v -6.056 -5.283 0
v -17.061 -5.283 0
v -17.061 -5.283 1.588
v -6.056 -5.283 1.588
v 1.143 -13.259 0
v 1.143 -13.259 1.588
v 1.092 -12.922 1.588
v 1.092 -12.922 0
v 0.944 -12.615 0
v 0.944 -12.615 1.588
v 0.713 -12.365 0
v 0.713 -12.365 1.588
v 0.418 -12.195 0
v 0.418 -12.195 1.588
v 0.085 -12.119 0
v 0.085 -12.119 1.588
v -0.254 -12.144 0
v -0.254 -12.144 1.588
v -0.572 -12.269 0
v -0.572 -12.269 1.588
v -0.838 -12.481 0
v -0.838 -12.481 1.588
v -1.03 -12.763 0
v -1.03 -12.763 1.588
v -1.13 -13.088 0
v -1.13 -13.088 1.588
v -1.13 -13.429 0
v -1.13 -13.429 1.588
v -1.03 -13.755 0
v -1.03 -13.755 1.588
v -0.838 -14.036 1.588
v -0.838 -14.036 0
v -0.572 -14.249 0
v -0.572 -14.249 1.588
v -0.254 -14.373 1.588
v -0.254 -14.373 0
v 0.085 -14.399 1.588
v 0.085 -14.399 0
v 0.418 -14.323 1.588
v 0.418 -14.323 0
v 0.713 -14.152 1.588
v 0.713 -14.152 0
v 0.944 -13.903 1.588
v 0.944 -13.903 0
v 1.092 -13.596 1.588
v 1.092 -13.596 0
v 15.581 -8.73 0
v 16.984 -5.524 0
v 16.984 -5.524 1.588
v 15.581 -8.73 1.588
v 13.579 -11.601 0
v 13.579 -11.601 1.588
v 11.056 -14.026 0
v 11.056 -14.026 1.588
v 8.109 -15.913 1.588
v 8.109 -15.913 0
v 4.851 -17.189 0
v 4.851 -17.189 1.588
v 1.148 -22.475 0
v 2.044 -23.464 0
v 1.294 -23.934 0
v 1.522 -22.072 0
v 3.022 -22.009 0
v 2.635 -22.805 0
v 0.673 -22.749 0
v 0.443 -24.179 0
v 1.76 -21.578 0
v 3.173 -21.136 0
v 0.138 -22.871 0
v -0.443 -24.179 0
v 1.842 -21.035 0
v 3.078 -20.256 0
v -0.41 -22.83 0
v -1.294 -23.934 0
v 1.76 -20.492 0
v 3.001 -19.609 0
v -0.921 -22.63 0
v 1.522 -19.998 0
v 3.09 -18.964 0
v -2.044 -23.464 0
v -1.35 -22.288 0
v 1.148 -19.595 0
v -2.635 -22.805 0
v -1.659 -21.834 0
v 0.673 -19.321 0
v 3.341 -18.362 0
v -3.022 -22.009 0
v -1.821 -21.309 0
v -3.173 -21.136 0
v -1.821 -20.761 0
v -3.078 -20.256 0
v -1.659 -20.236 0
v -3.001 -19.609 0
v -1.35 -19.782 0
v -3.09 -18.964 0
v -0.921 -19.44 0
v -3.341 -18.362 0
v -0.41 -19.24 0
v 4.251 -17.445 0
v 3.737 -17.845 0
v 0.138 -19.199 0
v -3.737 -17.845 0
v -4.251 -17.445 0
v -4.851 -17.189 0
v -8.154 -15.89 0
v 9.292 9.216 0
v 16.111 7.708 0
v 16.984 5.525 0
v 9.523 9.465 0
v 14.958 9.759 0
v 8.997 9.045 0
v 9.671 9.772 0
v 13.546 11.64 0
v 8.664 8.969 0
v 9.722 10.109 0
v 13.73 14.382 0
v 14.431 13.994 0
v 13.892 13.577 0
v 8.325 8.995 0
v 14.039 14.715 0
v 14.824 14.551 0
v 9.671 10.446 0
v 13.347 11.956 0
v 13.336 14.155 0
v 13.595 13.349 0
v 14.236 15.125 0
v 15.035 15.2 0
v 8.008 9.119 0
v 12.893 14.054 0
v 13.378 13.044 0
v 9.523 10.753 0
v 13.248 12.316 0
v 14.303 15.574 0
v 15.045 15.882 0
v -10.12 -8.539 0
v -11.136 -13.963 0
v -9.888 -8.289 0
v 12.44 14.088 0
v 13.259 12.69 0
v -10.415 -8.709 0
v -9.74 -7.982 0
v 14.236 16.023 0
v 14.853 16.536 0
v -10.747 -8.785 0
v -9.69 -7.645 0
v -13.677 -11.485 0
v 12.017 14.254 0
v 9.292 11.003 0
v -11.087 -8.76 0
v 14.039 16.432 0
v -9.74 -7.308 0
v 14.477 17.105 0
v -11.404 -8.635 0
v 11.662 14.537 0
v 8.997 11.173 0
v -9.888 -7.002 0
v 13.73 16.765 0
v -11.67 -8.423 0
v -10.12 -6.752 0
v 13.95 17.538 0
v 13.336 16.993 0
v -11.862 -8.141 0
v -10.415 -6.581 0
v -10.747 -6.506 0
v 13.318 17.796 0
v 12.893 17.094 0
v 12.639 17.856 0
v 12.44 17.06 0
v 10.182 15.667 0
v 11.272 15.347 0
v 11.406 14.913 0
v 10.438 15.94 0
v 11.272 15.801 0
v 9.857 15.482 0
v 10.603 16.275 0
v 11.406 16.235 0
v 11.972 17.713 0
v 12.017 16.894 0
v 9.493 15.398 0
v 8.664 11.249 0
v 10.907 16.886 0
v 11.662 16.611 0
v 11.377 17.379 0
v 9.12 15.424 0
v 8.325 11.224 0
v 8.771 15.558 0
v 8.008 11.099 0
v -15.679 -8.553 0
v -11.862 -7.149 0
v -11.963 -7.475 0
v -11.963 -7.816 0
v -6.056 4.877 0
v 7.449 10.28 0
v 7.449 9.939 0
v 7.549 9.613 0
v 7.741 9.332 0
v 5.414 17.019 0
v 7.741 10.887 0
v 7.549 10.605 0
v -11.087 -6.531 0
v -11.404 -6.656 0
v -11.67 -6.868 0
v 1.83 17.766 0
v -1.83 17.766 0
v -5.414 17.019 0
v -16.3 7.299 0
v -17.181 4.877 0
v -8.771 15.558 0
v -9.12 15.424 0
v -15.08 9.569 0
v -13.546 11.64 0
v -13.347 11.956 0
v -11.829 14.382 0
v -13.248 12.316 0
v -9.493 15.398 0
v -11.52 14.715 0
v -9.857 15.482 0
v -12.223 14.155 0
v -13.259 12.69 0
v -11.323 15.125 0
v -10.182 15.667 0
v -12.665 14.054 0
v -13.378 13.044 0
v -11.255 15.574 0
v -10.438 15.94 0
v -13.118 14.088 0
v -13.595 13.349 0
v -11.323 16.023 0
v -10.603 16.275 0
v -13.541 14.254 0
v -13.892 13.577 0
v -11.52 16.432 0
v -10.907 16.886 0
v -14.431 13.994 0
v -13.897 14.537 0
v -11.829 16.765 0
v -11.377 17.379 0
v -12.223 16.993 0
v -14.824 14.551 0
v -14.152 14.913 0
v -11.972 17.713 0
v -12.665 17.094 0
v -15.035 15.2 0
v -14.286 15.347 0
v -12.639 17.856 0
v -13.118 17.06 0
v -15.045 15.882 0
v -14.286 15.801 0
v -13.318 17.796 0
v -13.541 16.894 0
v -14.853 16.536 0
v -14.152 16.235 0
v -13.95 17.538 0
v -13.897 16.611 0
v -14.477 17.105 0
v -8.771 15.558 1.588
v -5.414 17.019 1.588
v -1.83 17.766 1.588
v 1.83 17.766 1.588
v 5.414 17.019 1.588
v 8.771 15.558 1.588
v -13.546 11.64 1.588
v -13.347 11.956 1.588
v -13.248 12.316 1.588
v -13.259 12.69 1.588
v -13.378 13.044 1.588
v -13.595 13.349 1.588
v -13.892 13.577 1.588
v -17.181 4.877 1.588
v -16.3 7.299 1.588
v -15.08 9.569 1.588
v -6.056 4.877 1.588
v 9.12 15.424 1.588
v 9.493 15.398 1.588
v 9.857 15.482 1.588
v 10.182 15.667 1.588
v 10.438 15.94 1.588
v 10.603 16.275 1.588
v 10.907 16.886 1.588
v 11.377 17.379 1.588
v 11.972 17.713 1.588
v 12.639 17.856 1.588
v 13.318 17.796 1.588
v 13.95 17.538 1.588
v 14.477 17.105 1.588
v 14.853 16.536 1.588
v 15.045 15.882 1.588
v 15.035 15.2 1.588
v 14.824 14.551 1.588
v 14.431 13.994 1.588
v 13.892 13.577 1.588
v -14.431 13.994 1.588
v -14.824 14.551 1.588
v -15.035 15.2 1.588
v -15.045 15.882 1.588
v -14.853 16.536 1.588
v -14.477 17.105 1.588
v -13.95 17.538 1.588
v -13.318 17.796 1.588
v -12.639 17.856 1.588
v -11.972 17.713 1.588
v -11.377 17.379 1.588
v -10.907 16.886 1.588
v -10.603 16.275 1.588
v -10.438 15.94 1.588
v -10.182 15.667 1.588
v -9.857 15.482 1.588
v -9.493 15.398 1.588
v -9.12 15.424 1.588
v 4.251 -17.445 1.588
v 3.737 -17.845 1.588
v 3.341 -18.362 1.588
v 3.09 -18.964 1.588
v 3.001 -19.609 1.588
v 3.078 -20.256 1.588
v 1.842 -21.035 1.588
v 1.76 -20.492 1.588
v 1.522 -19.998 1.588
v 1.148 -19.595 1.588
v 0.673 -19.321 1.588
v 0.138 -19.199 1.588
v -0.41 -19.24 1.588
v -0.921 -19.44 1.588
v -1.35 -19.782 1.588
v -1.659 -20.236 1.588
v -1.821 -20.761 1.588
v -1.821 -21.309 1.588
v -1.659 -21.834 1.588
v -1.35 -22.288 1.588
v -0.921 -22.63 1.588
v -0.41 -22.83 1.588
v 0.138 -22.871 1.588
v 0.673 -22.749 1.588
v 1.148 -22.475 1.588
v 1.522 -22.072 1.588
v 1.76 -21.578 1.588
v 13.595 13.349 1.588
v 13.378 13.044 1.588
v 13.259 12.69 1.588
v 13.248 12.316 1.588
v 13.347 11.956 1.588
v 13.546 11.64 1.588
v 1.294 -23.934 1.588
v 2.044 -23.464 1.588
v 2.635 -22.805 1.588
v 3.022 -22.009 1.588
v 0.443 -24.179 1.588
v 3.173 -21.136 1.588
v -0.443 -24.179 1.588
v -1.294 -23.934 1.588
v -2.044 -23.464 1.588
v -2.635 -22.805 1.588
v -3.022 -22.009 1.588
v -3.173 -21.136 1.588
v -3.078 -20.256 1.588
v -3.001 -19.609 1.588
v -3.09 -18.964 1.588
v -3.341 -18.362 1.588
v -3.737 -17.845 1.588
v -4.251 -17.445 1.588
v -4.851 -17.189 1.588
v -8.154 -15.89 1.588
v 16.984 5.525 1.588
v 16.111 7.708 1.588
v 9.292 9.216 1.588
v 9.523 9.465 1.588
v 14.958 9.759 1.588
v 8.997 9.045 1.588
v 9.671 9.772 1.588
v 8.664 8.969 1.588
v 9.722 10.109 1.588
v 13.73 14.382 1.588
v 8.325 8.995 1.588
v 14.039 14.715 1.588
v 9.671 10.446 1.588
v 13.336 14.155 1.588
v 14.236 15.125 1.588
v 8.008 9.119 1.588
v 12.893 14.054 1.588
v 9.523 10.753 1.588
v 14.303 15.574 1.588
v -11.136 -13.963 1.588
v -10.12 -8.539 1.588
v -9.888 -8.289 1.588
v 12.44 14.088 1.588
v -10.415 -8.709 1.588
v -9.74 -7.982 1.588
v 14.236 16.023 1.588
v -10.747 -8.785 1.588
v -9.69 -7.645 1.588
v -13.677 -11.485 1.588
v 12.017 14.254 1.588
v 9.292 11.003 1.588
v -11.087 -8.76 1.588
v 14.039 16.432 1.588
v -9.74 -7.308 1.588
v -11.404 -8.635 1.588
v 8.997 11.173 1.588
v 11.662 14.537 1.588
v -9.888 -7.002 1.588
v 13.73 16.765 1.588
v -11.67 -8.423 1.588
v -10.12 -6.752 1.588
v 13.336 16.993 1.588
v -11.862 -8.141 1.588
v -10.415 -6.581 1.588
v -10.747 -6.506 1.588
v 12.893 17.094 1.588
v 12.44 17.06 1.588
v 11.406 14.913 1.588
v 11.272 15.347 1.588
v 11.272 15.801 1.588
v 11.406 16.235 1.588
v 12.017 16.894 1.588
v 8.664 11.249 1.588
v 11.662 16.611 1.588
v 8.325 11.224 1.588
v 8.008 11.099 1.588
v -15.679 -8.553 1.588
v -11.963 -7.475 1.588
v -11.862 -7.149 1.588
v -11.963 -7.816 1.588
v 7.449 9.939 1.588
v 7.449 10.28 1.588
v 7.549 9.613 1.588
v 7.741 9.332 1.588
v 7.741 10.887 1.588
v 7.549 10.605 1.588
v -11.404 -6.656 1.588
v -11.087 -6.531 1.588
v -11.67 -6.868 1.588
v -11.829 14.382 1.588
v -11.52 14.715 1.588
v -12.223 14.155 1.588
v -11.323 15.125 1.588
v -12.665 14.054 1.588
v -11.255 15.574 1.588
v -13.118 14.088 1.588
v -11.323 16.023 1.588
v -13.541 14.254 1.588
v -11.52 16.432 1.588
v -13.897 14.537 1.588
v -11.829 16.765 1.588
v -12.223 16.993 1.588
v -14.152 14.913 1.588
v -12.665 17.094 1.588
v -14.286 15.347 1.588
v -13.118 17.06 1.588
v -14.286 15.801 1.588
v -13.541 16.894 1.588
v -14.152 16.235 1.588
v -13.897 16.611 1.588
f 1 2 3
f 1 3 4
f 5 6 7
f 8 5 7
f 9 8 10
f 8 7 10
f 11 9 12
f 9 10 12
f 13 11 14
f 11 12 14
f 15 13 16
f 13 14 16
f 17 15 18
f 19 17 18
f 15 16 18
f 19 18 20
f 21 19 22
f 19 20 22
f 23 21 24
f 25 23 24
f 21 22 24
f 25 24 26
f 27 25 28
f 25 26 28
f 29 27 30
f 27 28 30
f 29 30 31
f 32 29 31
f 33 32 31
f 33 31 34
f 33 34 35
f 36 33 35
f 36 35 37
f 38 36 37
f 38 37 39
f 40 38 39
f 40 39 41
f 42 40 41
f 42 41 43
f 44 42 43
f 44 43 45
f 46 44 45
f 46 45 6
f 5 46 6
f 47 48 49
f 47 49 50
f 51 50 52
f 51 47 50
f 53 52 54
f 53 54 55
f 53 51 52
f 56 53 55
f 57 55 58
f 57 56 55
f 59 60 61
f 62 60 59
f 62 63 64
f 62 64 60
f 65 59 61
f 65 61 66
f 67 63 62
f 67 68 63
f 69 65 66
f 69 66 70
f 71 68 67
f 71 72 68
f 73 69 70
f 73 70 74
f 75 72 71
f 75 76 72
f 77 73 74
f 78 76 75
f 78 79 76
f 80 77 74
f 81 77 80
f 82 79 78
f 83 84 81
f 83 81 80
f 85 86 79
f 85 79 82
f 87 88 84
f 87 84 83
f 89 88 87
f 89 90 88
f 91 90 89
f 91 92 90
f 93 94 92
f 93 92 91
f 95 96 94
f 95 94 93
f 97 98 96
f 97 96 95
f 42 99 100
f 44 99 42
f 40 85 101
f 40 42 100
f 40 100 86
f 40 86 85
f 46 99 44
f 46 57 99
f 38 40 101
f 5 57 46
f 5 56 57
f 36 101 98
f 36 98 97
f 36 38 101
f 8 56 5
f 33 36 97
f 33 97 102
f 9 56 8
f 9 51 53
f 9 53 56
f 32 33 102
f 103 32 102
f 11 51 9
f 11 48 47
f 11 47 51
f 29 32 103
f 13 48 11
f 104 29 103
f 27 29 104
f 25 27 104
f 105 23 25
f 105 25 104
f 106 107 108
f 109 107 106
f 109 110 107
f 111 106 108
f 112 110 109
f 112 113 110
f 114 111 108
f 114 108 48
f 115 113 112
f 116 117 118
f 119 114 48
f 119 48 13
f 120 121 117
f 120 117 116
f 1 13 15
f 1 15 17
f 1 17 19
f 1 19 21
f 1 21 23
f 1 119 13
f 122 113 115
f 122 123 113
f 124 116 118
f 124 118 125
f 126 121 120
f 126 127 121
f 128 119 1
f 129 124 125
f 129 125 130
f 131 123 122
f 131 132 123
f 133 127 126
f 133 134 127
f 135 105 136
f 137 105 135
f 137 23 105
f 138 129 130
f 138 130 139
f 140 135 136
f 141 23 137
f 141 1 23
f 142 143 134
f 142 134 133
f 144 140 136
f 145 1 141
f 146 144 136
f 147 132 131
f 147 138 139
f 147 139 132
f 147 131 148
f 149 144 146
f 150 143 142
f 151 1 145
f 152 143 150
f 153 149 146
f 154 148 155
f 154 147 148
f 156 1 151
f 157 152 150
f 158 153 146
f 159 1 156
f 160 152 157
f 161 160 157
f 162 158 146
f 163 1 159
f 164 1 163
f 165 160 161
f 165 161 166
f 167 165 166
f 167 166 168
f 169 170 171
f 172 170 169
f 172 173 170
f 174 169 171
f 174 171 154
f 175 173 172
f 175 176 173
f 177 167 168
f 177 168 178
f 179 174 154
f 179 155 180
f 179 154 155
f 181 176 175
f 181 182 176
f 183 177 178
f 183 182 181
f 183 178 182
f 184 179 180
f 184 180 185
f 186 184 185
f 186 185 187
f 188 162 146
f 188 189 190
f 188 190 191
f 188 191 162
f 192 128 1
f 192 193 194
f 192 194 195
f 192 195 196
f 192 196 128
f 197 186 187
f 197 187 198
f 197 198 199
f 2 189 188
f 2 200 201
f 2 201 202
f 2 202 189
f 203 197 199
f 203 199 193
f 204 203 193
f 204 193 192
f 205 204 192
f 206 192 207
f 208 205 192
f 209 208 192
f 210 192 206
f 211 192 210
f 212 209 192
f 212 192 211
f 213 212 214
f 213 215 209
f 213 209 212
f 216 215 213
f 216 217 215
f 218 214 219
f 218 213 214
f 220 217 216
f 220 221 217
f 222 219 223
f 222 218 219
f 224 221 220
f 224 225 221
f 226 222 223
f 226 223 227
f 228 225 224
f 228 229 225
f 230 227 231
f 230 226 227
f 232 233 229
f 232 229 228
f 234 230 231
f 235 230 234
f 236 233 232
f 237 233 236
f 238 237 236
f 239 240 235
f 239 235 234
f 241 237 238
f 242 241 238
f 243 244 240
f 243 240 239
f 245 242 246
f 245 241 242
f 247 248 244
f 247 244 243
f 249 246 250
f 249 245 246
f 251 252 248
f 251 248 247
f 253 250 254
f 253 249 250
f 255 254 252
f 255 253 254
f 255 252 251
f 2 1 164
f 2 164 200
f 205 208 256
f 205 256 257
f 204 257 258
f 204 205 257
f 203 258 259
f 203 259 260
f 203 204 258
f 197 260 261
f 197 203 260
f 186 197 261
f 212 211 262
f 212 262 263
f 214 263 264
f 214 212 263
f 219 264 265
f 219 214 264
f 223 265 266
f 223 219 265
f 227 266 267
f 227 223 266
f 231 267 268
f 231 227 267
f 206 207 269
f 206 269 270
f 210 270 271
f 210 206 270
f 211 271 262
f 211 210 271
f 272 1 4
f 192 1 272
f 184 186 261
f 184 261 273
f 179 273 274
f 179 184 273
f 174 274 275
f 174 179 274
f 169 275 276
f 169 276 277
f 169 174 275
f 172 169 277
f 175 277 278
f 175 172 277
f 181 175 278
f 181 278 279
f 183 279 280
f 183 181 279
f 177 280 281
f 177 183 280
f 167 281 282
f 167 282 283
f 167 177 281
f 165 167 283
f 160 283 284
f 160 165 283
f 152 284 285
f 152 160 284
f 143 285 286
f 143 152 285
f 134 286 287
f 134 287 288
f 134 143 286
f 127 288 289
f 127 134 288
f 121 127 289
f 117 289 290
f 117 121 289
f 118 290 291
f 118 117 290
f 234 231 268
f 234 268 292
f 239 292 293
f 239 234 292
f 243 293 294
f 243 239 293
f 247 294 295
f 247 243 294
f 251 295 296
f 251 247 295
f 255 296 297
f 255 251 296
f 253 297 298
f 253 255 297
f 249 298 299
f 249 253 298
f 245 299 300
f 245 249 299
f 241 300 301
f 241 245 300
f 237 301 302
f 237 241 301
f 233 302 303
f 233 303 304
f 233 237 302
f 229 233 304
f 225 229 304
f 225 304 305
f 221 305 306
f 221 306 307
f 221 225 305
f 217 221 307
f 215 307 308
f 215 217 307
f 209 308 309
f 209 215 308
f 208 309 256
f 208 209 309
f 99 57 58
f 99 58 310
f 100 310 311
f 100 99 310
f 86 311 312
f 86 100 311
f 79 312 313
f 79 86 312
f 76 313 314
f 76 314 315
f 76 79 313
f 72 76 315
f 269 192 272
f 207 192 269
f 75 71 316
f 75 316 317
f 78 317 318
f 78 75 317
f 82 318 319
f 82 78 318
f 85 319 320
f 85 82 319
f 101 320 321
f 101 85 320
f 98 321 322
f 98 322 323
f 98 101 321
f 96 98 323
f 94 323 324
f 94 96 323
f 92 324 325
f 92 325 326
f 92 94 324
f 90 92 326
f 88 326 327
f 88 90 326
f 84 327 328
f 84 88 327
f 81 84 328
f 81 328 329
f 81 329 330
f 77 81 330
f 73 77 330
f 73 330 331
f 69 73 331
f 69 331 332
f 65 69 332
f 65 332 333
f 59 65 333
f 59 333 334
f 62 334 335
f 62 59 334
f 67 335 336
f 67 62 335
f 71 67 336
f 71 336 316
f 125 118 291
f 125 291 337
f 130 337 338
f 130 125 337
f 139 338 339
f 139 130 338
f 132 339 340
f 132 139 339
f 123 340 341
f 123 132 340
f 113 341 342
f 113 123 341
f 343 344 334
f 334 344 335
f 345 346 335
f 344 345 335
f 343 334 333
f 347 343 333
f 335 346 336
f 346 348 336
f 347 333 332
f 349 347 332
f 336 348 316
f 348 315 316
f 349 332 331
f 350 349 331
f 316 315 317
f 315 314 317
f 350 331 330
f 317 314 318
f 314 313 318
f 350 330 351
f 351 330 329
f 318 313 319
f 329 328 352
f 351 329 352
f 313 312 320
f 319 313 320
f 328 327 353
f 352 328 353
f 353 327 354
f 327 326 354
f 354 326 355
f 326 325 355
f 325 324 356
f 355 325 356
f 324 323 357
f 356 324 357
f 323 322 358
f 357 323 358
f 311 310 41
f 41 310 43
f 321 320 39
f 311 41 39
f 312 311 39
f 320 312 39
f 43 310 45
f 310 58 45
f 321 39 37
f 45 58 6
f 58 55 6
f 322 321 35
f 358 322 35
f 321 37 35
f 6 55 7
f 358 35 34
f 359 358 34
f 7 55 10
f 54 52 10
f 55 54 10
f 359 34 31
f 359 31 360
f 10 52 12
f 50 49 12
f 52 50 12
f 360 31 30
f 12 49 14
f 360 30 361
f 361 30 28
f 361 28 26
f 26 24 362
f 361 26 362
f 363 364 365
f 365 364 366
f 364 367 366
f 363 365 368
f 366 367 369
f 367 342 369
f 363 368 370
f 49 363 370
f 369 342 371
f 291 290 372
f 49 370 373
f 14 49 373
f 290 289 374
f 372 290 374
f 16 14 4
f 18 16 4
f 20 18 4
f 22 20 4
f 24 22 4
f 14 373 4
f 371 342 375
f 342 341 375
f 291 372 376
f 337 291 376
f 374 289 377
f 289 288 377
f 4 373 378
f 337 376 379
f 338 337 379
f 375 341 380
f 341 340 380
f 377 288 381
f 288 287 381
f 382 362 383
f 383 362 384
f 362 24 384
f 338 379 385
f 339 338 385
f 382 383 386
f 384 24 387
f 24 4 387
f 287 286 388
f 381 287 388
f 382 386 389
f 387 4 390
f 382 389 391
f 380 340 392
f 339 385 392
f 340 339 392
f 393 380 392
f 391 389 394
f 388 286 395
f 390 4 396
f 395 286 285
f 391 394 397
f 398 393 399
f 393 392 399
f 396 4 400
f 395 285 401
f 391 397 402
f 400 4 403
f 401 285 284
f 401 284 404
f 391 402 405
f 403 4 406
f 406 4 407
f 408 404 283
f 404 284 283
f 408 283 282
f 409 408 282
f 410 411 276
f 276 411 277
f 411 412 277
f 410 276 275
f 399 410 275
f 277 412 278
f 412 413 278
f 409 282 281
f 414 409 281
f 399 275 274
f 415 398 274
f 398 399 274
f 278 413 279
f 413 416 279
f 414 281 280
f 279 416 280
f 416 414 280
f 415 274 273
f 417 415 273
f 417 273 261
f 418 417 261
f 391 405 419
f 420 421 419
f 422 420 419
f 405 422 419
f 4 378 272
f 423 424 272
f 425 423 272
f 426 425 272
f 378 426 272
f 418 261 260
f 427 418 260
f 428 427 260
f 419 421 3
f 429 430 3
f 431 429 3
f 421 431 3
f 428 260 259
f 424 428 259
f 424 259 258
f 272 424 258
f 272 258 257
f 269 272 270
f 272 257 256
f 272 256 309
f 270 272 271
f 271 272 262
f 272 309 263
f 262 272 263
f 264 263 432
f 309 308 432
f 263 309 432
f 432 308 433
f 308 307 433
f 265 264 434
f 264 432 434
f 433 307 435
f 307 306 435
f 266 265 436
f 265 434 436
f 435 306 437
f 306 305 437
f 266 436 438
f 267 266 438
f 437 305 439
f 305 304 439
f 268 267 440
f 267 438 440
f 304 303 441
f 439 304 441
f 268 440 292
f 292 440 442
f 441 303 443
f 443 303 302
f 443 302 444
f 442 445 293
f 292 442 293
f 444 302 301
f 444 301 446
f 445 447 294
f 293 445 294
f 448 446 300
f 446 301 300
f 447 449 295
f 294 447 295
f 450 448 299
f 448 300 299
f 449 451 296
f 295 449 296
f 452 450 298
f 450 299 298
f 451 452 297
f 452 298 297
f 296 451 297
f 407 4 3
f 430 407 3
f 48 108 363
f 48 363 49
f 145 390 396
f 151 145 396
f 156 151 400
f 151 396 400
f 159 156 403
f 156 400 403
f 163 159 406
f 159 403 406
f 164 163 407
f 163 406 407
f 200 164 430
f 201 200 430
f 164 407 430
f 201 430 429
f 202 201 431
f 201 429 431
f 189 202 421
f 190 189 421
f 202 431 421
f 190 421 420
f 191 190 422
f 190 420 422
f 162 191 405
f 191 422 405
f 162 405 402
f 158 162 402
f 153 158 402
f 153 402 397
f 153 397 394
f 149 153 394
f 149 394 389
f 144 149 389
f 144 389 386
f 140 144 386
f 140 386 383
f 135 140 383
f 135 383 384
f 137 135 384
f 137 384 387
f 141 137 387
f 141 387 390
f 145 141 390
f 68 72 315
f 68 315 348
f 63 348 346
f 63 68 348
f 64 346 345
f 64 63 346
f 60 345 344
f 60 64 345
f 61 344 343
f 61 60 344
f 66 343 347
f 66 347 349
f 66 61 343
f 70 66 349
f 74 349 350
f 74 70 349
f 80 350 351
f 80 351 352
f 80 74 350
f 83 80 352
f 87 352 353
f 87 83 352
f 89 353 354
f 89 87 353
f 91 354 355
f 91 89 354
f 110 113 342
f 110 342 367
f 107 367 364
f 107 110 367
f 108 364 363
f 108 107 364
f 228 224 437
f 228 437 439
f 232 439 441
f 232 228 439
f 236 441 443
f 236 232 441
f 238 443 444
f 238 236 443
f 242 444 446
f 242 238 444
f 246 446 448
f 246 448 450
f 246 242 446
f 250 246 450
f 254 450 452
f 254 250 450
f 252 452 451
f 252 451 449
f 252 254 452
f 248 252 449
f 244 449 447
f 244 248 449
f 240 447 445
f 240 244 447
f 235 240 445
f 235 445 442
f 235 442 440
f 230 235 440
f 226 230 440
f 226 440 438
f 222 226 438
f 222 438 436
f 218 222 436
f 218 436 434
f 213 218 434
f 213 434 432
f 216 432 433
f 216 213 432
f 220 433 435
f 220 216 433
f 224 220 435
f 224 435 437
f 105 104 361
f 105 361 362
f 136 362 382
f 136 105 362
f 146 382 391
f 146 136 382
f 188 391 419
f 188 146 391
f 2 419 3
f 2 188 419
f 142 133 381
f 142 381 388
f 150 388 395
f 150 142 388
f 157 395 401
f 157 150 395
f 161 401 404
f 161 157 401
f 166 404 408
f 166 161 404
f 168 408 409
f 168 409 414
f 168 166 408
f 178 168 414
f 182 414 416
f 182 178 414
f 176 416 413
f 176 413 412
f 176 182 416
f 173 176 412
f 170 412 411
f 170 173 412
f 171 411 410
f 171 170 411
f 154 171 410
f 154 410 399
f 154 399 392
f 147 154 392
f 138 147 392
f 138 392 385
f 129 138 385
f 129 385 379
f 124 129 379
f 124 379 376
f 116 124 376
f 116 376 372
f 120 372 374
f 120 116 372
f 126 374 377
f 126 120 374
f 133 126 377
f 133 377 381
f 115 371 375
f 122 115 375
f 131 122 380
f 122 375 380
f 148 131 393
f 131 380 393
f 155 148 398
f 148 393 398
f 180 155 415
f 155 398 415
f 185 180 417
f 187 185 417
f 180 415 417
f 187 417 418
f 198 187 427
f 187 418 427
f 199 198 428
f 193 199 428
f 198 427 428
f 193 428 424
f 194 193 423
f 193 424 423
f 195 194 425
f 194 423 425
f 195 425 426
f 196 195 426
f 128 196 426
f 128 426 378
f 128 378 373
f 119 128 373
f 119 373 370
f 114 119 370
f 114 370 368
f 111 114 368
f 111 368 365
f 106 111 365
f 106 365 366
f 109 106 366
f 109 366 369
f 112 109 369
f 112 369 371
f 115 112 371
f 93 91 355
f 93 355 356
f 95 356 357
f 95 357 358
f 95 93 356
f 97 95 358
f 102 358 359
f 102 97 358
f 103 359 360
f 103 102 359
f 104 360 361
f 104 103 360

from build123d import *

# Parameters (mm, degrees)
SKETCH1_R           = 1.8415
SKETCH1_R_2         = 1.524
BOSS_EXTRUDE1_DEPTH = 1.5875
SKETCH2_R           = 1.143
CUT_EXTRUDE1_DEPTH  = 30.729408631


with BuildPart() as part:
    # Sketch1 → Boss-Extrude1 (new body)
    with BuildSketch(Plane.XY):
        with BuildLine():
            Line((-6.056265338, 4.8768), (-17.181244816, 4.8768))
            ThreePointArc((-17.181244816, 4.8768), (-15.73141865, 8.455815687), (-13.546192494, 11.63954555))
            ThreePointArc((-13.546192494, 11.63954555), (-13.259158261, 12.690113591), (-13.891550513, 13.576771304))
            ThreePointArc((-13.891550513, 13.576771304), (-14.229434947, 17.341171737), (-10.60343846, 16.274857526))
            ThreePointArc((-10.60343846, 16.274857526), (-9.857305878, 15.481530337), (-8.770915553, 15.557936625))
            ThreePointArc((-8.770915553, 15.557936625), (0, 17.859965052), (8.770915553, 15.557936625))
            ThreePointArc((8.770915553, 15.557936625), (9.857305878, 15.481530337), (10.60343846, 16.274857526))
            ThreePointArc((10.60343846, 16.274857526), (14.229434947, 17.341171737), (13.891550513, 13.576771304))
            ThreePointArc((13.891550513, 13.576771304), (13.259158261, 12.690113591), (13.546192494, 11.63954555))
            ThreePointArc((13.546192494, 11.63954555), (15.568317368, 8.752476564), (16.984058744, 5.5245))
            Line((16.984058744, 5.5245), (16.984058744, -5.5245))
            ThreePointArc((16.984058744, -5.5245), (12.377442365, -12.875452309), (4.850582957, -17.188664772))
            ThreePointArc((4.850582957, -17.188664772), (3.34119056, -18.362373067), (3.078011585, -20.256203417))
            ThreePointArc((3.078011585, -20.256203417), (0, -24.209965052), (-3.078011585, -20.256203417))
            ThreePointArc((-3.078011585, -20.256203417), (-3.34119056, -18.362373067), (-4.850582957, -17.188664772))
            ThreePointArc((-4.850582957, -17.188664772), (-12.468387001, -12.78740307), (-17.060660873, -5.2832))
            Line((-17.060660873, -5.2832), (-6.056265338, -5.2832))
            Line((-6.056265338, -5.2832), (-6.056265338, 4.8768))
        make_face()
        with Locations((0, -21.034965052)):
            Circle(SKETCH1_R, mode=Mode.SUBTRACT)
        with Locations((12.779339593, 15.573965052)):
            Circle(SKETCH1_R_2, mode=Mode.SUBTRACT)
        with Locations((-12.779339593, 15.573965052)):
            Circle(SKETCH1_R_2, mode=Mode.SUBTRACT)
    extrude(amount=BOSS_EXTRUDE1_DEPTH)

    # Sketch2 → Cut-Extrude1 (cut, through all)
    with BuildSketch(Plane.XY.offset(1.5875)):
        with Locations((8.579035657, 10.1092)):
            Circle(SKETCH2_R)
        with Locations((-10.832526773, -7.6454)):
            Circle(SKETCH2_R)
        with Locations((0, -13.2588)):
            Circle(SKETCH2_R)
    extrude(amount=-CUT_EXTRUDE1_DEPTH, mode=Mode.SUBTRACT)


solid = part.part
